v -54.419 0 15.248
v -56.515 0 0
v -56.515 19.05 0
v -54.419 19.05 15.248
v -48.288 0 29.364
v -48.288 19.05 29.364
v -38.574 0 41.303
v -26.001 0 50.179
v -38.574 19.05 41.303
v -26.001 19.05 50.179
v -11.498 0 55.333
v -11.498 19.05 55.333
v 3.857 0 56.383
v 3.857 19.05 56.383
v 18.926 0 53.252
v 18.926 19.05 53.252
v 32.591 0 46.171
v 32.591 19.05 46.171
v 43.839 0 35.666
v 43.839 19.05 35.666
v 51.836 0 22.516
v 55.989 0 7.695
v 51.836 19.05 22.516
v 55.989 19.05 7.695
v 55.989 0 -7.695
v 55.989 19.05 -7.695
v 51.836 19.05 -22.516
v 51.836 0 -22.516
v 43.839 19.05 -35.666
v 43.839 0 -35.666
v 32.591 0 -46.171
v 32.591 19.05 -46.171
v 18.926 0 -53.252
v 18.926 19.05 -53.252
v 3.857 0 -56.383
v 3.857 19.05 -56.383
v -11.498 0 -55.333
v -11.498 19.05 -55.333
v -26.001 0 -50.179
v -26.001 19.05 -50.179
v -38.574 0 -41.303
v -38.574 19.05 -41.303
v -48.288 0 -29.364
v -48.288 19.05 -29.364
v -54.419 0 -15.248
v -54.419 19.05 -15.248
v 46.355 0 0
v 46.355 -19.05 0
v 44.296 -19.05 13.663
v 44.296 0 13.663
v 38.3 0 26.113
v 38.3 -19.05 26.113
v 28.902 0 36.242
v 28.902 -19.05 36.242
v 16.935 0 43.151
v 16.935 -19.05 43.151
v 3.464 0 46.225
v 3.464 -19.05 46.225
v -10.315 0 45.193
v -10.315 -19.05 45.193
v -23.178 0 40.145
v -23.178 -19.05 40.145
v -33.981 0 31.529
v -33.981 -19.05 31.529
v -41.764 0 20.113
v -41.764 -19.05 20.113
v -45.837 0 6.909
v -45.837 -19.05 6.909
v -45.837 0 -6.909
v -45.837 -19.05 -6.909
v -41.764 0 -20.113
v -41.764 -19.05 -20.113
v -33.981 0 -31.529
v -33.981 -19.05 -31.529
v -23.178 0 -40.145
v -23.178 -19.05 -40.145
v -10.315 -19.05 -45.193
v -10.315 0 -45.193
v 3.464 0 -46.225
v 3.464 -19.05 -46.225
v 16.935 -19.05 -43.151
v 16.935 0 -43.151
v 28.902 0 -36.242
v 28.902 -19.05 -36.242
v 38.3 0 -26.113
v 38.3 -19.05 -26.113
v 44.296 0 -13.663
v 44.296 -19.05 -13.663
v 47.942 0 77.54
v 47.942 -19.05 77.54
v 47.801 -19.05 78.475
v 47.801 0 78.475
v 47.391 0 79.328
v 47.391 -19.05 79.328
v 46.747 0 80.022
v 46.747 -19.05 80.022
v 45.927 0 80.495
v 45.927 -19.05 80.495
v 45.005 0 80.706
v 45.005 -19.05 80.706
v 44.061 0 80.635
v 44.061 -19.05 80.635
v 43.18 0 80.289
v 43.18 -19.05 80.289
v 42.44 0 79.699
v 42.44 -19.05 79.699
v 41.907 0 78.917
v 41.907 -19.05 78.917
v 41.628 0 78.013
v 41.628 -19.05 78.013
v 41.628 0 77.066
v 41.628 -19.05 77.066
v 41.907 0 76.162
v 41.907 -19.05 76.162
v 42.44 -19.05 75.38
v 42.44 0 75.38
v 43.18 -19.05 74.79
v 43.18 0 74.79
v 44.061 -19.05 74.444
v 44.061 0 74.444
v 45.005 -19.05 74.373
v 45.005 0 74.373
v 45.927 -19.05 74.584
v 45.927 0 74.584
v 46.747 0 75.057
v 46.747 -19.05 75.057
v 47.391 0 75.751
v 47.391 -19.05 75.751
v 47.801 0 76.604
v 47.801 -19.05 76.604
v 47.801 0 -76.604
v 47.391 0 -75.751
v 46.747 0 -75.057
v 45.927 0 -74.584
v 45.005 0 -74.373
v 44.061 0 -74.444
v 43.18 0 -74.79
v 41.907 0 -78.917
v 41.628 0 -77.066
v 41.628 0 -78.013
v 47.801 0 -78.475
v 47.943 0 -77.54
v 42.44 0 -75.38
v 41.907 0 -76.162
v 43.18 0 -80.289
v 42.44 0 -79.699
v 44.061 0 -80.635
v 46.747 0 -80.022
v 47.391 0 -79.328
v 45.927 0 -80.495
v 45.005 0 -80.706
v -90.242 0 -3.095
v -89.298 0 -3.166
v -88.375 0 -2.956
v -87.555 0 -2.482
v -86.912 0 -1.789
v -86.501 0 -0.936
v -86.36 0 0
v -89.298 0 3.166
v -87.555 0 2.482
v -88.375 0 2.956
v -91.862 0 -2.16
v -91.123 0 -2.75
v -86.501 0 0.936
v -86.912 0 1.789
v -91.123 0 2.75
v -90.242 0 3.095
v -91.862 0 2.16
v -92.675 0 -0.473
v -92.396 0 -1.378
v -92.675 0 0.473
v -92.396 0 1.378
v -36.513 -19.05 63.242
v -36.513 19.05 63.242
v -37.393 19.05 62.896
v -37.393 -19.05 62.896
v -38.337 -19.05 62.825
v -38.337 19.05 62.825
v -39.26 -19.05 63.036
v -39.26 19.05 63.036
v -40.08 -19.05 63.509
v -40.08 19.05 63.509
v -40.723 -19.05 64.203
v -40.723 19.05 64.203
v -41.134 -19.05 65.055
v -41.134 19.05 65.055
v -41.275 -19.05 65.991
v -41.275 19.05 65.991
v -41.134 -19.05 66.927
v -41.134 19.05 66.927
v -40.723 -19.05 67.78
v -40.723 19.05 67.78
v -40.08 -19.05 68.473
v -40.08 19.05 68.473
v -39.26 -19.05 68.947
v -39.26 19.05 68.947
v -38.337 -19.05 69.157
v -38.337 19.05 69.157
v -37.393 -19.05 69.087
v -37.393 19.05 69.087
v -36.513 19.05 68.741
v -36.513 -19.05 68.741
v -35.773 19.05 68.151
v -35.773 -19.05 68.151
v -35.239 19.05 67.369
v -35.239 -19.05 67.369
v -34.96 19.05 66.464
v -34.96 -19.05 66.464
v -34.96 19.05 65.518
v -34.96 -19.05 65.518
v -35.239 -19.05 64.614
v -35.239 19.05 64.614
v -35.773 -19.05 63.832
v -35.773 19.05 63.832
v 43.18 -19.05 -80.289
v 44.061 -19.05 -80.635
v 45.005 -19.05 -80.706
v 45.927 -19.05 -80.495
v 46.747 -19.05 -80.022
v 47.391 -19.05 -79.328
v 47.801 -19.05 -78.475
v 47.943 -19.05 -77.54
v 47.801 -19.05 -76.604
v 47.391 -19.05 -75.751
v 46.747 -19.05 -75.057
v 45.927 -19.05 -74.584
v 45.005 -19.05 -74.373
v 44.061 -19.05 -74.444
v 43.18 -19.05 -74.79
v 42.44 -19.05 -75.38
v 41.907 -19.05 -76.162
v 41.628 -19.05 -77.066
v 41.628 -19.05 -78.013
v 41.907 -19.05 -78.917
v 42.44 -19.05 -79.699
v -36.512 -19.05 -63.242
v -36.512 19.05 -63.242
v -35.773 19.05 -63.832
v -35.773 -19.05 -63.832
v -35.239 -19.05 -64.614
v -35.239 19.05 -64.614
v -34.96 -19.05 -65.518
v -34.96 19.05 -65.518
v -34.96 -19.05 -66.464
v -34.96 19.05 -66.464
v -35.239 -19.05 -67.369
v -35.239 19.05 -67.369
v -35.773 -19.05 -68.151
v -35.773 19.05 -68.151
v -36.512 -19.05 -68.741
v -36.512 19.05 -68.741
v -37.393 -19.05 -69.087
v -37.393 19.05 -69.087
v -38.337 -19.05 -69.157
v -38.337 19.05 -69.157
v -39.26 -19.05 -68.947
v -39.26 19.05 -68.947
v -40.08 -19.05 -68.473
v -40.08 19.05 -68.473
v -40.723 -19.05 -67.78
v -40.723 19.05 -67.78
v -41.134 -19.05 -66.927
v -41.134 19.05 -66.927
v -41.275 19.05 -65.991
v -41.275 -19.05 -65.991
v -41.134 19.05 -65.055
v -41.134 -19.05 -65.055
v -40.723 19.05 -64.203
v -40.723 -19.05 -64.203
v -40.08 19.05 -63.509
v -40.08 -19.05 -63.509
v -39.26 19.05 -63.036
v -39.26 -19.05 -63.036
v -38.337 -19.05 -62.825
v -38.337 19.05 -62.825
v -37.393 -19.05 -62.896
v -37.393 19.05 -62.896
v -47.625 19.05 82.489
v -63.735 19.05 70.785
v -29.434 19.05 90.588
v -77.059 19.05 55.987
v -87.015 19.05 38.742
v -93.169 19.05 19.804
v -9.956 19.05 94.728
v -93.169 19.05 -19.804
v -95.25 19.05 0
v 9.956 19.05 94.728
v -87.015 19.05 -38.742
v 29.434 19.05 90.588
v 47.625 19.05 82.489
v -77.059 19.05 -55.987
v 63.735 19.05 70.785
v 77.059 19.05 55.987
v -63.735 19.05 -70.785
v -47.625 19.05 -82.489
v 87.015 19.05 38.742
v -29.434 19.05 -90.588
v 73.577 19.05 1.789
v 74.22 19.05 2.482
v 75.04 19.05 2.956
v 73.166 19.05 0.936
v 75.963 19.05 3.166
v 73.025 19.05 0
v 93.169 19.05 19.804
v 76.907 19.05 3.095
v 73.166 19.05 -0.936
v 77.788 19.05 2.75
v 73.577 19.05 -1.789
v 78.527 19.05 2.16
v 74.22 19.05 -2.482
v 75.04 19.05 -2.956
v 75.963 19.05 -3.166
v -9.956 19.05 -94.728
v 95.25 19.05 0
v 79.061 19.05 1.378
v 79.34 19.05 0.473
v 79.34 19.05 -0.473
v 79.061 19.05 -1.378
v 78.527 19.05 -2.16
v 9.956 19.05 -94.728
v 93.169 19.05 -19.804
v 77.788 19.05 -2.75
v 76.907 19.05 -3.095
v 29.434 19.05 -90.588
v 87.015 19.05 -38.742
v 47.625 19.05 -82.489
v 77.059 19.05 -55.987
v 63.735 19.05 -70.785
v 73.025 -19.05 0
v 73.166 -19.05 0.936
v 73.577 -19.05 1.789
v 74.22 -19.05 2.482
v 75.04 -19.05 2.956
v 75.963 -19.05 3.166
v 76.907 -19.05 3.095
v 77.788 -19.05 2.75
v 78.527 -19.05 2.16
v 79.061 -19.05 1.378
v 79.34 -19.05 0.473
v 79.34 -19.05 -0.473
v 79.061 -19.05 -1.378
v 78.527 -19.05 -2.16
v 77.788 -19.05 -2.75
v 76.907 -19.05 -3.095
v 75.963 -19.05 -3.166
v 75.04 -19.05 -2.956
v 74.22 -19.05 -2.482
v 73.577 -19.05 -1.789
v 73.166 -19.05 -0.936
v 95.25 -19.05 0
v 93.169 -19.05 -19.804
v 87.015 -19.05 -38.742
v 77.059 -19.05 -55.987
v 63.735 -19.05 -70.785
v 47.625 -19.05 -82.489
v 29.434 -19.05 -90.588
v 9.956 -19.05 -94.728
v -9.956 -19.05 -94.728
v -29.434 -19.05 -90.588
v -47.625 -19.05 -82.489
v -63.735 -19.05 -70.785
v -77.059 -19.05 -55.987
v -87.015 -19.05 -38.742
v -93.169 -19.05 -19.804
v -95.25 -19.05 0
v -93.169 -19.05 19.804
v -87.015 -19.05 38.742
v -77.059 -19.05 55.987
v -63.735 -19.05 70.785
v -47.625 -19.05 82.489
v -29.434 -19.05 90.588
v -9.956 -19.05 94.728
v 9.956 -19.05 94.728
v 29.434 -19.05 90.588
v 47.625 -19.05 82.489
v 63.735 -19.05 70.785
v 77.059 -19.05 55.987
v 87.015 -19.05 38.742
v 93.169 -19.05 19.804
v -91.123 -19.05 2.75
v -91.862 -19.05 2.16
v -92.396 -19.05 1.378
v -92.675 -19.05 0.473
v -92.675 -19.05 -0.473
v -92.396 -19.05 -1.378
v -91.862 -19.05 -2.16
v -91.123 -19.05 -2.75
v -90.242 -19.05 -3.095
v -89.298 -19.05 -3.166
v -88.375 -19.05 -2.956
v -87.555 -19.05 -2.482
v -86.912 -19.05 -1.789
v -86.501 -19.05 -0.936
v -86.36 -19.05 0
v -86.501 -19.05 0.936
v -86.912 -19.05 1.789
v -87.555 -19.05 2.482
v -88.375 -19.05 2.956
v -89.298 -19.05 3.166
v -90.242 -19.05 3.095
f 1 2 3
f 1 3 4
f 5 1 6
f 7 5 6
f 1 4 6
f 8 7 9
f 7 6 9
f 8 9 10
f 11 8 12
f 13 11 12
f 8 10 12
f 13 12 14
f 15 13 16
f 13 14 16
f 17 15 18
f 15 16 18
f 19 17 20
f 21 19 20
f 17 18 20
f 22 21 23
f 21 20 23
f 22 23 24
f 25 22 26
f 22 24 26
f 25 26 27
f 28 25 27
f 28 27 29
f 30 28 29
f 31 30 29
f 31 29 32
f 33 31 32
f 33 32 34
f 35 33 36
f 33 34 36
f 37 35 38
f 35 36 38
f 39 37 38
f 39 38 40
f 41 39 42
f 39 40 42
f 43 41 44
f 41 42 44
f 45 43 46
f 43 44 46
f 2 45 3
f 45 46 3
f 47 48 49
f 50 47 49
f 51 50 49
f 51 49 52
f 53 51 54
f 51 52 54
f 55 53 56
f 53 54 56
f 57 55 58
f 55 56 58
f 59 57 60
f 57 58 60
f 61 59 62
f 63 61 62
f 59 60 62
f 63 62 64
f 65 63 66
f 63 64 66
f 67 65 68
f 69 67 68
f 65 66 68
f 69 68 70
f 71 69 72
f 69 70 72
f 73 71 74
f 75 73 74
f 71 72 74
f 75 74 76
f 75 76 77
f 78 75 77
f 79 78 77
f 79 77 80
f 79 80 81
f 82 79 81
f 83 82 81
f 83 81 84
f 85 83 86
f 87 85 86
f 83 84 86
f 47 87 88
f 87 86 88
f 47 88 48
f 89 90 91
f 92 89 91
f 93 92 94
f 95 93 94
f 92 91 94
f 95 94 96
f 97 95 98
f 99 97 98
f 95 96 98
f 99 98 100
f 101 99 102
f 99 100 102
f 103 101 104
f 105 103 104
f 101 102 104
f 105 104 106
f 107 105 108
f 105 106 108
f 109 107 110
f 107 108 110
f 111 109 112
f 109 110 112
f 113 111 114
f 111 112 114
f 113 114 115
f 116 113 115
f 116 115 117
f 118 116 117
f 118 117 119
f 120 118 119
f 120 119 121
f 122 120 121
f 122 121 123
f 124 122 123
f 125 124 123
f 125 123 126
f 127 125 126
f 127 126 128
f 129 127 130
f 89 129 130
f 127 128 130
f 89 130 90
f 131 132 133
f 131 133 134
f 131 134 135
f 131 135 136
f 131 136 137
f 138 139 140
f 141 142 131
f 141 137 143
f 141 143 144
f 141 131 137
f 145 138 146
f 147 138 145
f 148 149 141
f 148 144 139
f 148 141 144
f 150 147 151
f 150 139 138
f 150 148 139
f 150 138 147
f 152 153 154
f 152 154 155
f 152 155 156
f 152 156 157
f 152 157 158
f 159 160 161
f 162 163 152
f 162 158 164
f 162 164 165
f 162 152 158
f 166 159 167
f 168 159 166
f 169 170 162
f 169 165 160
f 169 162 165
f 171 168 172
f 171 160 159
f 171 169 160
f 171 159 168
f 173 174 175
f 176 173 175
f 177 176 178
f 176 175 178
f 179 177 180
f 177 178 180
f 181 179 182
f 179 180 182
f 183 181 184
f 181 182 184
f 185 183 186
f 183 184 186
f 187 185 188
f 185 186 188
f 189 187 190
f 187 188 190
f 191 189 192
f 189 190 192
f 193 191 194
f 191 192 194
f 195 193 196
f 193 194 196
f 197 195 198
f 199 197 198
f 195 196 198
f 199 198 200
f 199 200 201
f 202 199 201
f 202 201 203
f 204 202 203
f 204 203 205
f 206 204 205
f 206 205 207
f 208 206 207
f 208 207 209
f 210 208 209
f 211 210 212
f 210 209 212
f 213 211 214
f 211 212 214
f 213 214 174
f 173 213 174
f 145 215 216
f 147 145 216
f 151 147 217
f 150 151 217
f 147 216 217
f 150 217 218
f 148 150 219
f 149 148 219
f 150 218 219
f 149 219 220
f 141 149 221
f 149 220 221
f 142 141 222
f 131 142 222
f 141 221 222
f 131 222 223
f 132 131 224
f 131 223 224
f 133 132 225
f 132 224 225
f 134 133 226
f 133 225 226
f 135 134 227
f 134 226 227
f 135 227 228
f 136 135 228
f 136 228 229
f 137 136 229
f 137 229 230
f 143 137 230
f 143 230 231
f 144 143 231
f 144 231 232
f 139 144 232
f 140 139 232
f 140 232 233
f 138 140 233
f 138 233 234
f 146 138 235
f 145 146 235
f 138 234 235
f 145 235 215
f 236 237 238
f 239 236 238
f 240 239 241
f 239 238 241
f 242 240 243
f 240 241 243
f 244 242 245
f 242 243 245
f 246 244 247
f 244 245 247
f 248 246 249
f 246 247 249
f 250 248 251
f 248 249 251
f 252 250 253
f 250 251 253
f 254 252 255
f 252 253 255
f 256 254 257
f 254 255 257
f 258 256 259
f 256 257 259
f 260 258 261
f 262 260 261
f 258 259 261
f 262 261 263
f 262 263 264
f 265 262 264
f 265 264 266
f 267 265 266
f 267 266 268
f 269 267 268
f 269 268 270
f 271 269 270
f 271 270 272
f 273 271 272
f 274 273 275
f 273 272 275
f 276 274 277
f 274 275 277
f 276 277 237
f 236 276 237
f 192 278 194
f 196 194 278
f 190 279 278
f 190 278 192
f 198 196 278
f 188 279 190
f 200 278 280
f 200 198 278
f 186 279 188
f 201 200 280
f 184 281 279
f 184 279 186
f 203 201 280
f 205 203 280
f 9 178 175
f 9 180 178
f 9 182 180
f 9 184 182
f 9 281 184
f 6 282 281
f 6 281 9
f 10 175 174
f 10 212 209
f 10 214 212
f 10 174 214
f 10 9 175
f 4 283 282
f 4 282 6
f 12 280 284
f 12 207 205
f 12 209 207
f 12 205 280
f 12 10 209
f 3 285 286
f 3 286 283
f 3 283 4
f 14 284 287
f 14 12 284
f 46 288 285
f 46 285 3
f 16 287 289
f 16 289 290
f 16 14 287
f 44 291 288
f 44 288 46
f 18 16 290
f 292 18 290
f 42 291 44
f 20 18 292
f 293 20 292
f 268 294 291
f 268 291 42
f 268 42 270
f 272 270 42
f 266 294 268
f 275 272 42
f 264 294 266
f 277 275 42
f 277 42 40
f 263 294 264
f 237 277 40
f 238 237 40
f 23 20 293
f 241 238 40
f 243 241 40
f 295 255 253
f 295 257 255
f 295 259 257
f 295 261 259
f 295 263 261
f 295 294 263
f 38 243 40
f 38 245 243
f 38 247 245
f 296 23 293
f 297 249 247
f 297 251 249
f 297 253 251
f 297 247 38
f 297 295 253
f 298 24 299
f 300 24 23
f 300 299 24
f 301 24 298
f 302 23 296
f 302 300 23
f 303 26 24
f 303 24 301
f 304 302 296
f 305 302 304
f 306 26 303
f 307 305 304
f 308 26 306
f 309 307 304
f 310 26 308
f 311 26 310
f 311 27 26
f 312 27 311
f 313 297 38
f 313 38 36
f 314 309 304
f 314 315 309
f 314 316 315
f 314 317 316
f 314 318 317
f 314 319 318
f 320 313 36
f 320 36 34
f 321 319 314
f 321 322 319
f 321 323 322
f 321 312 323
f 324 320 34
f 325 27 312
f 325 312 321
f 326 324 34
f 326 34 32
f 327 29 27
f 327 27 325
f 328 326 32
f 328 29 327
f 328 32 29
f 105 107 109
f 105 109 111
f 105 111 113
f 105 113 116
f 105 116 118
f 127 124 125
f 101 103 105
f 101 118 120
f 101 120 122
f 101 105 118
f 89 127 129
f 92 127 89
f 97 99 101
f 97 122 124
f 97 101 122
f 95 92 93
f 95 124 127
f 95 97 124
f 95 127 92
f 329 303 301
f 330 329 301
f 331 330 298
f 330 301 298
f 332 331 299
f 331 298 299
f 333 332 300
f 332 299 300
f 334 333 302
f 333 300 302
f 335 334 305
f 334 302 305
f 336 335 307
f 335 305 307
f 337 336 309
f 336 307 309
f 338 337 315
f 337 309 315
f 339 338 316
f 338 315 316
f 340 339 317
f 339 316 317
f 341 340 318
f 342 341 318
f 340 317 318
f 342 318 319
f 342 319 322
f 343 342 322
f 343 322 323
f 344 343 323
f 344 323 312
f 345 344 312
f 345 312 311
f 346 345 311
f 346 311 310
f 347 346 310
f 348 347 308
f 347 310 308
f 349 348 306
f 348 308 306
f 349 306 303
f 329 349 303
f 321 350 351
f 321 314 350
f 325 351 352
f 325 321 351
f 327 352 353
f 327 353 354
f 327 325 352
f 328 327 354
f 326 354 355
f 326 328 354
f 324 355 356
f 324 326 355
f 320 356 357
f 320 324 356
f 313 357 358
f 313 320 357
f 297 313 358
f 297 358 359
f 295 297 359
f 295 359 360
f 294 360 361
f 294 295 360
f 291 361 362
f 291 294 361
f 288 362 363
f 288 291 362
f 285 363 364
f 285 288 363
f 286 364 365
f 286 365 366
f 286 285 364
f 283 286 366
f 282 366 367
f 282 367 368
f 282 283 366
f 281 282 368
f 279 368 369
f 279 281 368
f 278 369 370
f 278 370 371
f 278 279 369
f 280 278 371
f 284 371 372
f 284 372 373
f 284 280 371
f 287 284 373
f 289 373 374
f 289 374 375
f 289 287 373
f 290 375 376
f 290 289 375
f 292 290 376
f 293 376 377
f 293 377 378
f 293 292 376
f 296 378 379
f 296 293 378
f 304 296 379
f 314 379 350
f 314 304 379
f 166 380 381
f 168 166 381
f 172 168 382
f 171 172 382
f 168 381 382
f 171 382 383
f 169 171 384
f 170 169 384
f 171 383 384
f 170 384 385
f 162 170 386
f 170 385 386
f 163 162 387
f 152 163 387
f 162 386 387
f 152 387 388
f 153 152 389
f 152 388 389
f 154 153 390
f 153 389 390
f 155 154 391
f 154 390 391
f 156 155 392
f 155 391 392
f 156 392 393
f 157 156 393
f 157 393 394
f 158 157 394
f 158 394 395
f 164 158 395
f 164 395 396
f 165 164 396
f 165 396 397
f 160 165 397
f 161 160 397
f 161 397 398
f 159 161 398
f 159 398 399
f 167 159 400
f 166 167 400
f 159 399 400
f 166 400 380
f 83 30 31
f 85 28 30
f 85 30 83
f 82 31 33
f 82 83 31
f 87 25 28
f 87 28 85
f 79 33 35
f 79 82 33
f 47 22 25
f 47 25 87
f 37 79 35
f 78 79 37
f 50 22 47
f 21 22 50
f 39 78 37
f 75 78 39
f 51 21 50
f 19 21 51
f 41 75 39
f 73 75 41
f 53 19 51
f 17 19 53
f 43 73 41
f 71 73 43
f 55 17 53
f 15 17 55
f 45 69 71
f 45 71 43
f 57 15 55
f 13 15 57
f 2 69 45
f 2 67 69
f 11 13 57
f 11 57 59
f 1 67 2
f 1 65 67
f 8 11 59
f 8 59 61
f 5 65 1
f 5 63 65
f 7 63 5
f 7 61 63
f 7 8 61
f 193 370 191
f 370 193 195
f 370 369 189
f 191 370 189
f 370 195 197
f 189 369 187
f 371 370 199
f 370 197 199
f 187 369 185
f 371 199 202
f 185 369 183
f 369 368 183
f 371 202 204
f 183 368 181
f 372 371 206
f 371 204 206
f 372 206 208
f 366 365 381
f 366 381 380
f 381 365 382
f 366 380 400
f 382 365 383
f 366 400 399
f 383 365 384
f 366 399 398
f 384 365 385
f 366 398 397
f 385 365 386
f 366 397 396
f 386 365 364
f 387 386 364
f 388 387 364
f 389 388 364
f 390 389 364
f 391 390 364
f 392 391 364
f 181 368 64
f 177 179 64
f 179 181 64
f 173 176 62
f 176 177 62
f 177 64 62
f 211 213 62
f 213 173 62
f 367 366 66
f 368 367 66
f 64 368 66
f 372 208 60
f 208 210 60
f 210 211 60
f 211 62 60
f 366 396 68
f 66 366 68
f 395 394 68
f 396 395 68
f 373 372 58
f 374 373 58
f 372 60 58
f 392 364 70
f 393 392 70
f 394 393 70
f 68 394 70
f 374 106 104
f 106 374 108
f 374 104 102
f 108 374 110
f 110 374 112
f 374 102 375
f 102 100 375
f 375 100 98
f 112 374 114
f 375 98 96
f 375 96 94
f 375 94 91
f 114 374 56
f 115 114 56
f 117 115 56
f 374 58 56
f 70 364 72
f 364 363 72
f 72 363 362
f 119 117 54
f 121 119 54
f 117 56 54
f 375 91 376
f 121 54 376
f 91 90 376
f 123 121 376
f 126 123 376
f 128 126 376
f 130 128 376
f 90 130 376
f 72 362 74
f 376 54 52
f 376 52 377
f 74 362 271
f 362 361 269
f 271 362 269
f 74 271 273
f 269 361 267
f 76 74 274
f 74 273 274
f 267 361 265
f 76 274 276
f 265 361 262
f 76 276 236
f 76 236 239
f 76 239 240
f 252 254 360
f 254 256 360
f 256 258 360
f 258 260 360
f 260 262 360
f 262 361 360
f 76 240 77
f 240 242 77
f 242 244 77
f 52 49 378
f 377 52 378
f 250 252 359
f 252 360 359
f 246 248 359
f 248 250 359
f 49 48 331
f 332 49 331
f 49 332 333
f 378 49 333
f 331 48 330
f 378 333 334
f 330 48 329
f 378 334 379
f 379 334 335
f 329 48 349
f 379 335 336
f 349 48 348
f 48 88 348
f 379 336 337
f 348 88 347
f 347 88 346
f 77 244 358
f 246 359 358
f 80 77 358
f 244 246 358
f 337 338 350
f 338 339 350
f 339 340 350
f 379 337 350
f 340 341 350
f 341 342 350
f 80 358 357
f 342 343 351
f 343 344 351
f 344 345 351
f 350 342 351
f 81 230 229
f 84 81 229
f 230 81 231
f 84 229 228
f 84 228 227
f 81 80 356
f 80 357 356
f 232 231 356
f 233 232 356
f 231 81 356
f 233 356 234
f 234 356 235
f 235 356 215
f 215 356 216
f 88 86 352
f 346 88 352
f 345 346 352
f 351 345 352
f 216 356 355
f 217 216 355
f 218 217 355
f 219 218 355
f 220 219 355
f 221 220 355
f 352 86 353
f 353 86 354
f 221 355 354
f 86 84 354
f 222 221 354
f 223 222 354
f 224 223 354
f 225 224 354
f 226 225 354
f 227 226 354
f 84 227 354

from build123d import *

# Parameters (mm, degrees)
SKETCH1_R           = 95.25
BOSS_EXTRUDE1_DEPTH = 19.05
SKETCH2_R           = 56.515
CUT_EXTRUDE1_DEPTH  = 19.05
SKETCH3_R           = 46.355
CUT_EXTRUDE2_DEPTH  = 19.05
SKETCH5_R           = 3.175
CUT_EXTRUDE3_DEPTH  = 38.1
CIRPATTERN1_COUNT   = 3
SKETCH6_R           = 3.175
CUT_EXTRUDE4_DEPTH  = 19.05
CIRPATTERN2_COUNT   = 3


with BuildPart() as part:
    # Sketch1 → Boss-Extrude1 (new body, symmetric)
    with BuildSketch(Plane(origin=(0, 0, 0), x_dir=(1, 0, 0), z_dir=(0, 1, 0))):
        Circle(SKETCH1_R)
    extrude(amount=BOSS_EXTRUDE1_DEPTH, both=True)

    # Sketch2 → Cut-Extrude1 (cut)
    with BuildSketch(Plane(origin=(0, 19.05, 0), x_dir=(-1, 0, 0), z_dir=(0, 1, 0))):
        Circle(SKETCH2_R)
    extrude(amount=-CUT_EXTRUDE1_DEPTH, mode=Mode.SUBTRACT)

    # Sketch3 → Cut-Extrude2 (cut)
    with BuildSketch(Plane.XZ.offset(19.05)):
        Circle(SKETCH3_R)
    extrude(amount=-CUT_EXTRUDE2_DEPTH, mode=Mode.SUBTRACT)

    # Sketch5 → Cut-Extrude3 (cut)
    with BuildSketch(Plane(origin=(0, 19.05, 0), x_dir=(-1, 0, 0), z_dir=(0, 1, 0))):
        with Locations((-76.2, 0)):
            Circle(SKETCH5_R)
    cut_extrude3 = extrude(amount=-CUT_EXTRUDE3_DEPTH, mode=Mode.SUBTRACT)

    # CirPattern1: Cut-Extrude3 ×3 about axis
    cirpattern1_axis = Axis((0, 0, 0), (0, 1, 0))
    for i in range(1, CIRPATTERN1_COUNT):
        add(cut_extrude3.rotate(cirpattern1_axis, i * 360 / CIRPATTERN1_COUNT), mode=Mode.SUBTRACT)

    # Sketch6 → Cut-Extrude4 (cut)
    with BuildSketch(Plane.XZ.offset(19.05)):
        with Locations((44.7675, 77.539584528)):
            Circle(SKETCH6_R)
    cut_extrude4 = extrude(amount=-CUT_EXTRUDE4_DEPTH, mode=Mode.SUBTRACT)

    # CirPattern2: Cut-Extrude4 ×3 about axis
    cirpattern2_axis = Axis((0, 0, 0), (0, 1, 0))
    for i in range(1, CIRPATTERN2_COUNT):
        add(cut_extrude4.rotate(cirpattern2_axis, i * 360 / CIRPATTERN2_COUNT), mode=Mode.SUBTRACT)


solid = part.part
